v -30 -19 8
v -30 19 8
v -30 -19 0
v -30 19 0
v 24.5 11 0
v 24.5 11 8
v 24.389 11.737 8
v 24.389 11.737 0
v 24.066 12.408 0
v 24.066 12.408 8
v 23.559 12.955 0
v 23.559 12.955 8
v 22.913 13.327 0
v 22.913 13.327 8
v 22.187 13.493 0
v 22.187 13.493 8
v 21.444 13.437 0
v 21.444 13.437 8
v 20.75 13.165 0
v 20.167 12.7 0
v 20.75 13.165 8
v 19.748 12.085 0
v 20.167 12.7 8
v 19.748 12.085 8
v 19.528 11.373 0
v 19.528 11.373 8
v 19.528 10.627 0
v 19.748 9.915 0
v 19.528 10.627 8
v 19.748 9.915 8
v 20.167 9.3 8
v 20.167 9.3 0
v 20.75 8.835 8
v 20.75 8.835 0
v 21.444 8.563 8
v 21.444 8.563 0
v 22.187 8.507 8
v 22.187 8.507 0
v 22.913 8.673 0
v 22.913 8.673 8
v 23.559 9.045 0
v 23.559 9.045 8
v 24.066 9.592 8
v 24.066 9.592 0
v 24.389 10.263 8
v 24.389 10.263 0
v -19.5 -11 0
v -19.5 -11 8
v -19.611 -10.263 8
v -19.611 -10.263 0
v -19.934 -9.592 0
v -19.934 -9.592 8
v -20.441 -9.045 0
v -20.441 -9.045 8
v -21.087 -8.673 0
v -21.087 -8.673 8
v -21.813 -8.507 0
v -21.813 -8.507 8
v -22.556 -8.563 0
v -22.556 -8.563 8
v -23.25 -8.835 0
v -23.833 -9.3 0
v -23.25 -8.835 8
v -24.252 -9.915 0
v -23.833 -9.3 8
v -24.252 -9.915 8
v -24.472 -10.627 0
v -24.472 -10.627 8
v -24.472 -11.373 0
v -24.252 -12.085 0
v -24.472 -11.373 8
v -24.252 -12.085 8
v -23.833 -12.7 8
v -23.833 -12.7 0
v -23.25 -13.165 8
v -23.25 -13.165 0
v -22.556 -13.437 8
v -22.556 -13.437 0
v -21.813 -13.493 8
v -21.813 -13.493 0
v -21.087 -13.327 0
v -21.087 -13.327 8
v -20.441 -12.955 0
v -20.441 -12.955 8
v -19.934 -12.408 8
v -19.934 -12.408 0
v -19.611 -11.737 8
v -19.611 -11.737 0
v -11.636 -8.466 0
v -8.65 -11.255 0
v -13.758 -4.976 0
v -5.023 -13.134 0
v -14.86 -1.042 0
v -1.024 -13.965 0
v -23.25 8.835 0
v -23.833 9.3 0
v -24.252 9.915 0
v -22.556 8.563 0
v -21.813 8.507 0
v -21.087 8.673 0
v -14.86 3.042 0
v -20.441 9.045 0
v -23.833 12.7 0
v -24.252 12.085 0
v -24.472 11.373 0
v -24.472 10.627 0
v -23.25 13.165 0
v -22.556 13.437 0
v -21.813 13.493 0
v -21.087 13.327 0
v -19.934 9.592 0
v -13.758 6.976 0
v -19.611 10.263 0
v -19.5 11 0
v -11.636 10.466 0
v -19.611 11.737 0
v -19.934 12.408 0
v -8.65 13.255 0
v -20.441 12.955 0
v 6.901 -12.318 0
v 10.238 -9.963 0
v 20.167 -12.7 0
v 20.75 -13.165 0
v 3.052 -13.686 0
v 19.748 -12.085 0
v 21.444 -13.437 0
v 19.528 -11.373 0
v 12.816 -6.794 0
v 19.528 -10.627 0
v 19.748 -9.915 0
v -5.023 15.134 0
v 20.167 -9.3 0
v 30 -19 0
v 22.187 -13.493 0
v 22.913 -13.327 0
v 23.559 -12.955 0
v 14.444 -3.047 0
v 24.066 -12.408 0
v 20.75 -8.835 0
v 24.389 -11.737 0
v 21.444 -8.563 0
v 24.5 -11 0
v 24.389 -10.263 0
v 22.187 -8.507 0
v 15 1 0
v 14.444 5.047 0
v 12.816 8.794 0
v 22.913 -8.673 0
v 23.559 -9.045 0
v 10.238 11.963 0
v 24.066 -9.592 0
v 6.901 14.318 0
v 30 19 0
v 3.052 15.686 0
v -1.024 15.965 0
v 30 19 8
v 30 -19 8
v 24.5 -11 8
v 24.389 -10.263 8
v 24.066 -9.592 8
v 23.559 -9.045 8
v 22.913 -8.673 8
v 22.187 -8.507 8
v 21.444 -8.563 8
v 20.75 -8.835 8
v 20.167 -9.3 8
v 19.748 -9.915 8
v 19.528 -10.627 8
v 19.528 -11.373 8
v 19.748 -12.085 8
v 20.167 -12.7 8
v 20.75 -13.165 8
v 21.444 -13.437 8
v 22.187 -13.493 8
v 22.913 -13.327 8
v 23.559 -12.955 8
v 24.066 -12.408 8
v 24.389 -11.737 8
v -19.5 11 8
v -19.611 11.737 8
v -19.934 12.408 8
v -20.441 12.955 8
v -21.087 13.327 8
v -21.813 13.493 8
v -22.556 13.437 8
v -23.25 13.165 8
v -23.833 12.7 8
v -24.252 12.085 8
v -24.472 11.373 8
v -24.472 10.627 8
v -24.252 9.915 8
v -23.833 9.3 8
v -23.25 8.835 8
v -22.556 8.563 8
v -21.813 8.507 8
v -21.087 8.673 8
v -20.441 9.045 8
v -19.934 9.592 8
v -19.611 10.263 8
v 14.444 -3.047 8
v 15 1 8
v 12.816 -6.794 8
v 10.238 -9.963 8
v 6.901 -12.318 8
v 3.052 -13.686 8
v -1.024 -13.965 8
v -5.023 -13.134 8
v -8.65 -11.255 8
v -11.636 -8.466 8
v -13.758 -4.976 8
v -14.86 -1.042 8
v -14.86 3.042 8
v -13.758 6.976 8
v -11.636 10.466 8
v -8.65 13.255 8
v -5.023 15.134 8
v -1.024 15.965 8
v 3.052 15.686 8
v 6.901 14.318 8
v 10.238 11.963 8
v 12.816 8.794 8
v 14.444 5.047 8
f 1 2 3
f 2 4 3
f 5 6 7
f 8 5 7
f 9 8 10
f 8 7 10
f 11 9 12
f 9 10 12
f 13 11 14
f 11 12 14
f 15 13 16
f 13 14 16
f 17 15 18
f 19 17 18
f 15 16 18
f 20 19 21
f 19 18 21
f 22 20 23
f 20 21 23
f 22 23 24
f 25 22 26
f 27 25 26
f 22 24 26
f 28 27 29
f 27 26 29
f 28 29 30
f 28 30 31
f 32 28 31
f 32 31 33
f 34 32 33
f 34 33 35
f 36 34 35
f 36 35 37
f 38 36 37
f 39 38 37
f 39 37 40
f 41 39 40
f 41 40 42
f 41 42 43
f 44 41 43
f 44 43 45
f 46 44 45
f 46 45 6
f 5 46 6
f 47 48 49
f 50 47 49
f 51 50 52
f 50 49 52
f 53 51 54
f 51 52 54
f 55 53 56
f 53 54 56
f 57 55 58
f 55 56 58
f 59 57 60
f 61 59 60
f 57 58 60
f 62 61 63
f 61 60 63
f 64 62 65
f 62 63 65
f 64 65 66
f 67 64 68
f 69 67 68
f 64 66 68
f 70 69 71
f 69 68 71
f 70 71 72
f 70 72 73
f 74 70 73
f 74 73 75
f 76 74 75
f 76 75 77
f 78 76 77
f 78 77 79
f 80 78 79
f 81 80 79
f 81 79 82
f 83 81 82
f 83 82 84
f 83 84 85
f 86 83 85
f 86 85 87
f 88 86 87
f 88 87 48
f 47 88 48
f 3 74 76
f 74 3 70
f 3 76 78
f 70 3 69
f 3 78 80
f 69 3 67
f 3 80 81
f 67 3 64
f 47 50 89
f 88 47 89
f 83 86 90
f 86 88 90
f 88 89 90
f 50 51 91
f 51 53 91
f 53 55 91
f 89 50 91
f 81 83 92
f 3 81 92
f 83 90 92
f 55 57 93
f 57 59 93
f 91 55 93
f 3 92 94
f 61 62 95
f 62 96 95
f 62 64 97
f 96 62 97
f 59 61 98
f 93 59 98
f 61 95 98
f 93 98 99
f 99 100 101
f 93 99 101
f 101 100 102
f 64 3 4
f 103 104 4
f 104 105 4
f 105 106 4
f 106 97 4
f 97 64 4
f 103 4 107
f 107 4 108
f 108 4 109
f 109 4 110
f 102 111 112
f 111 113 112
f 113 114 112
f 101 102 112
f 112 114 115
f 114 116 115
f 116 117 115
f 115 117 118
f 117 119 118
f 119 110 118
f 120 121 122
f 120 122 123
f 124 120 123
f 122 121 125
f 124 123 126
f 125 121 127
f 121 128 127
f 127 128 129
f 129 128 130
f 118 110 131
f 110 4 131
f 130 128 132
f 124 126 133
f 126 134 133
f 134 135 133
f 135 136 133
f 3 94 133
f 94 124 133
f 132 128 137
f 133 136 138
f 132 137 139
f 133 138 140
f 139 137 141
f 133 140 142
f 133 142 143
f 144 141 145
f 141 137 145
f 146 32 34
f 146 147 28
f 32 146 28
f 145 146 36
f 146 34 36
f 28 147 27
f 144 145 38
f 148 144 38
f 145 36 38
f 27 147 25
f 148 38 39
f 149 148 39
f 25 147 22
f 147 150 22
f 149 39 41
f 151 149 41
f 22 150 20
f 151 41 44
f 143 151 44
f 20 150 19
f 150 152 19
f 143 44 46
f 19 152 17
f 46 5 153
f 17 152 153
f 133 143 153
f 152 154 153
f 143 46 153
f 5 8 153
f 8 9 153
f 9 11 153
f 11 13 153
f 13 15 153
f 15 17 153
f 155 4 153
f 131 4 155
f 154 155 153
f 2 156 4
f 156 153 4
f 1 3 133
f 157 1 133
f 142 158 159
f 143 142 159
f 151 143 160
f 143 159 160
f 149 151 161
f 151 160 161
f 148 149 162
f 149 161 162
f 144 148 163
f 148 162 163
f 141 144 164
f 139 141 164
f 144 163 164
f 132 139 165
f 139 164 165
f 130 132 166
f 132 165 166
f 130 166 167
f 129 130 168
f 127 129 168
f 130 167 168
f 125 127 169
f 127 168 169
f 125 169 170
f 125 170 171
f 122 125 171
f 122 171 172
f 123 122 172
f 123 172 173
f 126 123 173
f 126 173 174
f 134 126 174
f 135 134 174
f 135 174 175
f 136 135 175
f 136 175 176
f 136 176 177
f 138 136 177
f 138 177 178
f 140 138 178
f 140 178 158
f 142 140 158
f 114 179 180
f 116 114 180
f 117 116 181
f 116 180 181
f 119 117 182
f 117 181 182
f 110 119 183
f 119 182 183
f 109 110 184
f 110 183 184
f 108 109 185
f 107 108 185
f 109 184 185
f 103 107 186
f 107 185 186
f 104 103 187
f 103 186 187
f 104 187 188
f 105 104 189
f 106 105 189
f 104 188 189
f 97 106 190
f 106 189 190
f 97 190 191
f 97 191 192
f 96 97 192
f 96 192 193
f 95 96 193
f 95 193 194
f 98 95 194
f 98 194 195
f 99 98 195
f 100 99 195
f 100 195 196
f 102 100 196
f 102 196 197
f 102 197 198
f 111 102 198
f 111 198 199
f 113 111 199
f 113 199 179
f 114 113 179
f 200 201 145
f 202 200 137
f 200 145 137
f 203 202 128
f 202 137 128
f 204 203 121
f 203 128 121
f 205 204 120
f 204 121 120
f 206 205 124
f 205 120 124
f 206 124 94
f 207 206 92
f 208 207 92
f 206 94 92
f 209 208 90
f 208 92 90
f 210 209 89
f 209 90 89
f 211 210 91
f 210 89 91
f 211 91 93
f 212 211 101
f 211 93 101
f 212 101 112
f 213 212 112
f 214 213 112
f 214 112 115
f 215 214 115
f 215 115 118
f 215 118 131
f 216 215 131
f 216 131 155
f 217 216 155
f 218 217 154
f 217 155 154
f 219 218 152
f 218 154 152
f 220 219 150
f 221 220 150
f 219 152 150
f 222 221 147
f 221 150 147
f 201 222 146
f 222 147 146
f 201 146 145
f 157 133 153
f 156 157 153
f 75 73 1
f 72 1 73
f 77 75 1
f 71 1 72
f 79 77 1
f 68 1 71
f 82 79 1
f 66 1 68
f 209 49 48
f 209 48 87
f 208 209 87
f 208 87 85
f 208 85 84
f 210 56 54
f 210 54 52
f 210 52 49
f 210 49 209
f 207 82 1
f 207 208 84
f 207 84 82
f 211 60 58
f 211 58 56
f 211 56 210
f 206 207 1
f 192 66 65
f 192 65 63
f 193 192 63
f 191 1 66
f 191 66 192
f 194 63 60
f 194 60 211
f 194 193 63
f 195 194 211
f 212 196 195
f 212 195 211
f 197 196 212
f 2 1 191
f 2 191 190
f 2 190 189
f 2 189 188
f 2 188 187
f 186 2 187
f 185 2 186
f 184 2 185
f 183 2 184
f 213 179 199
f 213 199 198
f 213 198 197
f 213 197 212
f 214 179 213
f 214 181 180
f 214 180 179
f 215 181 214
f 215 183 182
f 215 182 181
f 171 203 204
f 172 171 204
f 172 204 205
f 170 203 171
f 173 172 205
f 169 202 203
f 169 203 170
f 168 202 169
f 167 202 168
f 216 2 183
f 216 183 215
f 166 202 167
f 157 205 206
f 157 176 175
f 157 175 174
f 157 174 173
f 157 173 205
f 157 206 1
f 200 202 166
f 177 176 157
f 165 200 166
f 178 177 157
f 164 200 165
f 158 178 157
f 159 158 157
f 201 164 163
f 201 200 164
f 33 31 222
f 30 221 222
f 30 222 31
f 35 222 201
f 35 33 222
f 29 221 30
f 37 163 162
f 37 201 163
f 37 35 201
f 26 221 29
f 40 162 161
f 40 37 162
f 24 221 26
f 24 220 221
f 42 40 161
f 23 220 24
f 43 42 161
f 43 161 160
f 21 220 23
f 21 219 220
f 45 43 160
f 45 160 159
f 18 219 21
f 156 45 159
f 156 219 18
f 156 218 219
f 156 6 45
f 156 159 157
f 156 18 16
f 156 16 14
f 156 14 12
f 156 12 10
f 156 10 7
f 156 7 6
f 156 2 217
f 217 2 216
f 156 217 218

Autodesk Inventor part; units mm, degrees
ref_plane "YZ Plane" through (0, 0, 0) normal (1, 0, 0) x (0, 1, 0)
ref_plane "XZ Plane" through (0, 0, 0) normal (0, 1, 0) x (-1, 0, 0)
ref_plane "XY Plane" through (0, 0, 0) normal (0, 0, 1) x (1, 0, 0)
sketch "Szkic1" plane through (0, 0, 0) normal (0, 0, 1) x (1, 0, 0)
  line L0 (-30, -19) -> (30, -19)
  line L1 (30, -19) -> (30, 19)
  line L2 (30, 19) -> (-30, 19)
  line L3 (-30, 19) -> (-30, -19)
  line L4 (-30, -19) -> (30, 19) construction
  line L5 (30, -19) -> (-30, 19) construction
  line L6 (0, 19) -> (0, 1)
  circle A0 centre (0, 1) radius 15
  point P0 (0, 0)
  dimension "d0" = 60
  dimension "d1" = 38
  dimension "d2" = 18
  dimension "d3" = 30
extrude "Wyciągnięcie proste1" add sketch "Szkic1" along normal blind 8
sketch "Szkic2" plane through (0, 0, 8) normal (0, 0, 1) x (1, 0, 0)
  circle A0 centre (0, 1) radius 15 projected
  line L0 (-30, -19) -> (30, -19) projected
  line L1 (30, -19) -> (30, 19) projected
  line L2 (30, 19) -> (-30, 19) projected
  line L3 (-30, 19) -> (-30, -19) projected
  line L4 (-30, 19) -> (-30, -19) projected
  line L5 (-30, 19) -> (-22, 19)
  line L6 (30, 19) -> (-30, 19) projected
  line L7 (-22, 19) -> (-22, -19)
  line L8 (30, 19) -> (22, 19)
  line L9 (22, 19) -> (22, -19)
  line L10 (-22, 19) -> (-22, 11)
  line L11 (-22, -19) -> (-22, -11)
  line L12 (22, 19) -> (22, 11)
  line L13 (22, -19) -> (22, -11)
  circle A1 centre (-22, 11) radius 2.5
  circle A2 centre (-22, -11) radius 2.5
  circle A3 centre (22, 11) radius 2.5
  circle A4 centre (22, -11) radius 2.5
  point P0 (0, 0)
  dimension "d6" = 8
  dimension "d7" = 8
  dimension "d8" = 8
  dimension "d9" = 8
  dimension "d10" = 8
  dimension "d11" = 8
  dimension "d12" = 5
  dimension "d13" = 5
  dimension "d14" = 5
  dimension "d15" = 5
extrude "Wyciągnięcie proste2" cut sketch "Szkic2" against normal up to next contours A2 L7 | L7 A2 | A4 L9 | L9 A4 | A1 L7 | L7 A1 | A3 L9 | L9 A3
properties part number "Uchwyt silnika krokowego osi X - płaski (blacha łożyska)"
